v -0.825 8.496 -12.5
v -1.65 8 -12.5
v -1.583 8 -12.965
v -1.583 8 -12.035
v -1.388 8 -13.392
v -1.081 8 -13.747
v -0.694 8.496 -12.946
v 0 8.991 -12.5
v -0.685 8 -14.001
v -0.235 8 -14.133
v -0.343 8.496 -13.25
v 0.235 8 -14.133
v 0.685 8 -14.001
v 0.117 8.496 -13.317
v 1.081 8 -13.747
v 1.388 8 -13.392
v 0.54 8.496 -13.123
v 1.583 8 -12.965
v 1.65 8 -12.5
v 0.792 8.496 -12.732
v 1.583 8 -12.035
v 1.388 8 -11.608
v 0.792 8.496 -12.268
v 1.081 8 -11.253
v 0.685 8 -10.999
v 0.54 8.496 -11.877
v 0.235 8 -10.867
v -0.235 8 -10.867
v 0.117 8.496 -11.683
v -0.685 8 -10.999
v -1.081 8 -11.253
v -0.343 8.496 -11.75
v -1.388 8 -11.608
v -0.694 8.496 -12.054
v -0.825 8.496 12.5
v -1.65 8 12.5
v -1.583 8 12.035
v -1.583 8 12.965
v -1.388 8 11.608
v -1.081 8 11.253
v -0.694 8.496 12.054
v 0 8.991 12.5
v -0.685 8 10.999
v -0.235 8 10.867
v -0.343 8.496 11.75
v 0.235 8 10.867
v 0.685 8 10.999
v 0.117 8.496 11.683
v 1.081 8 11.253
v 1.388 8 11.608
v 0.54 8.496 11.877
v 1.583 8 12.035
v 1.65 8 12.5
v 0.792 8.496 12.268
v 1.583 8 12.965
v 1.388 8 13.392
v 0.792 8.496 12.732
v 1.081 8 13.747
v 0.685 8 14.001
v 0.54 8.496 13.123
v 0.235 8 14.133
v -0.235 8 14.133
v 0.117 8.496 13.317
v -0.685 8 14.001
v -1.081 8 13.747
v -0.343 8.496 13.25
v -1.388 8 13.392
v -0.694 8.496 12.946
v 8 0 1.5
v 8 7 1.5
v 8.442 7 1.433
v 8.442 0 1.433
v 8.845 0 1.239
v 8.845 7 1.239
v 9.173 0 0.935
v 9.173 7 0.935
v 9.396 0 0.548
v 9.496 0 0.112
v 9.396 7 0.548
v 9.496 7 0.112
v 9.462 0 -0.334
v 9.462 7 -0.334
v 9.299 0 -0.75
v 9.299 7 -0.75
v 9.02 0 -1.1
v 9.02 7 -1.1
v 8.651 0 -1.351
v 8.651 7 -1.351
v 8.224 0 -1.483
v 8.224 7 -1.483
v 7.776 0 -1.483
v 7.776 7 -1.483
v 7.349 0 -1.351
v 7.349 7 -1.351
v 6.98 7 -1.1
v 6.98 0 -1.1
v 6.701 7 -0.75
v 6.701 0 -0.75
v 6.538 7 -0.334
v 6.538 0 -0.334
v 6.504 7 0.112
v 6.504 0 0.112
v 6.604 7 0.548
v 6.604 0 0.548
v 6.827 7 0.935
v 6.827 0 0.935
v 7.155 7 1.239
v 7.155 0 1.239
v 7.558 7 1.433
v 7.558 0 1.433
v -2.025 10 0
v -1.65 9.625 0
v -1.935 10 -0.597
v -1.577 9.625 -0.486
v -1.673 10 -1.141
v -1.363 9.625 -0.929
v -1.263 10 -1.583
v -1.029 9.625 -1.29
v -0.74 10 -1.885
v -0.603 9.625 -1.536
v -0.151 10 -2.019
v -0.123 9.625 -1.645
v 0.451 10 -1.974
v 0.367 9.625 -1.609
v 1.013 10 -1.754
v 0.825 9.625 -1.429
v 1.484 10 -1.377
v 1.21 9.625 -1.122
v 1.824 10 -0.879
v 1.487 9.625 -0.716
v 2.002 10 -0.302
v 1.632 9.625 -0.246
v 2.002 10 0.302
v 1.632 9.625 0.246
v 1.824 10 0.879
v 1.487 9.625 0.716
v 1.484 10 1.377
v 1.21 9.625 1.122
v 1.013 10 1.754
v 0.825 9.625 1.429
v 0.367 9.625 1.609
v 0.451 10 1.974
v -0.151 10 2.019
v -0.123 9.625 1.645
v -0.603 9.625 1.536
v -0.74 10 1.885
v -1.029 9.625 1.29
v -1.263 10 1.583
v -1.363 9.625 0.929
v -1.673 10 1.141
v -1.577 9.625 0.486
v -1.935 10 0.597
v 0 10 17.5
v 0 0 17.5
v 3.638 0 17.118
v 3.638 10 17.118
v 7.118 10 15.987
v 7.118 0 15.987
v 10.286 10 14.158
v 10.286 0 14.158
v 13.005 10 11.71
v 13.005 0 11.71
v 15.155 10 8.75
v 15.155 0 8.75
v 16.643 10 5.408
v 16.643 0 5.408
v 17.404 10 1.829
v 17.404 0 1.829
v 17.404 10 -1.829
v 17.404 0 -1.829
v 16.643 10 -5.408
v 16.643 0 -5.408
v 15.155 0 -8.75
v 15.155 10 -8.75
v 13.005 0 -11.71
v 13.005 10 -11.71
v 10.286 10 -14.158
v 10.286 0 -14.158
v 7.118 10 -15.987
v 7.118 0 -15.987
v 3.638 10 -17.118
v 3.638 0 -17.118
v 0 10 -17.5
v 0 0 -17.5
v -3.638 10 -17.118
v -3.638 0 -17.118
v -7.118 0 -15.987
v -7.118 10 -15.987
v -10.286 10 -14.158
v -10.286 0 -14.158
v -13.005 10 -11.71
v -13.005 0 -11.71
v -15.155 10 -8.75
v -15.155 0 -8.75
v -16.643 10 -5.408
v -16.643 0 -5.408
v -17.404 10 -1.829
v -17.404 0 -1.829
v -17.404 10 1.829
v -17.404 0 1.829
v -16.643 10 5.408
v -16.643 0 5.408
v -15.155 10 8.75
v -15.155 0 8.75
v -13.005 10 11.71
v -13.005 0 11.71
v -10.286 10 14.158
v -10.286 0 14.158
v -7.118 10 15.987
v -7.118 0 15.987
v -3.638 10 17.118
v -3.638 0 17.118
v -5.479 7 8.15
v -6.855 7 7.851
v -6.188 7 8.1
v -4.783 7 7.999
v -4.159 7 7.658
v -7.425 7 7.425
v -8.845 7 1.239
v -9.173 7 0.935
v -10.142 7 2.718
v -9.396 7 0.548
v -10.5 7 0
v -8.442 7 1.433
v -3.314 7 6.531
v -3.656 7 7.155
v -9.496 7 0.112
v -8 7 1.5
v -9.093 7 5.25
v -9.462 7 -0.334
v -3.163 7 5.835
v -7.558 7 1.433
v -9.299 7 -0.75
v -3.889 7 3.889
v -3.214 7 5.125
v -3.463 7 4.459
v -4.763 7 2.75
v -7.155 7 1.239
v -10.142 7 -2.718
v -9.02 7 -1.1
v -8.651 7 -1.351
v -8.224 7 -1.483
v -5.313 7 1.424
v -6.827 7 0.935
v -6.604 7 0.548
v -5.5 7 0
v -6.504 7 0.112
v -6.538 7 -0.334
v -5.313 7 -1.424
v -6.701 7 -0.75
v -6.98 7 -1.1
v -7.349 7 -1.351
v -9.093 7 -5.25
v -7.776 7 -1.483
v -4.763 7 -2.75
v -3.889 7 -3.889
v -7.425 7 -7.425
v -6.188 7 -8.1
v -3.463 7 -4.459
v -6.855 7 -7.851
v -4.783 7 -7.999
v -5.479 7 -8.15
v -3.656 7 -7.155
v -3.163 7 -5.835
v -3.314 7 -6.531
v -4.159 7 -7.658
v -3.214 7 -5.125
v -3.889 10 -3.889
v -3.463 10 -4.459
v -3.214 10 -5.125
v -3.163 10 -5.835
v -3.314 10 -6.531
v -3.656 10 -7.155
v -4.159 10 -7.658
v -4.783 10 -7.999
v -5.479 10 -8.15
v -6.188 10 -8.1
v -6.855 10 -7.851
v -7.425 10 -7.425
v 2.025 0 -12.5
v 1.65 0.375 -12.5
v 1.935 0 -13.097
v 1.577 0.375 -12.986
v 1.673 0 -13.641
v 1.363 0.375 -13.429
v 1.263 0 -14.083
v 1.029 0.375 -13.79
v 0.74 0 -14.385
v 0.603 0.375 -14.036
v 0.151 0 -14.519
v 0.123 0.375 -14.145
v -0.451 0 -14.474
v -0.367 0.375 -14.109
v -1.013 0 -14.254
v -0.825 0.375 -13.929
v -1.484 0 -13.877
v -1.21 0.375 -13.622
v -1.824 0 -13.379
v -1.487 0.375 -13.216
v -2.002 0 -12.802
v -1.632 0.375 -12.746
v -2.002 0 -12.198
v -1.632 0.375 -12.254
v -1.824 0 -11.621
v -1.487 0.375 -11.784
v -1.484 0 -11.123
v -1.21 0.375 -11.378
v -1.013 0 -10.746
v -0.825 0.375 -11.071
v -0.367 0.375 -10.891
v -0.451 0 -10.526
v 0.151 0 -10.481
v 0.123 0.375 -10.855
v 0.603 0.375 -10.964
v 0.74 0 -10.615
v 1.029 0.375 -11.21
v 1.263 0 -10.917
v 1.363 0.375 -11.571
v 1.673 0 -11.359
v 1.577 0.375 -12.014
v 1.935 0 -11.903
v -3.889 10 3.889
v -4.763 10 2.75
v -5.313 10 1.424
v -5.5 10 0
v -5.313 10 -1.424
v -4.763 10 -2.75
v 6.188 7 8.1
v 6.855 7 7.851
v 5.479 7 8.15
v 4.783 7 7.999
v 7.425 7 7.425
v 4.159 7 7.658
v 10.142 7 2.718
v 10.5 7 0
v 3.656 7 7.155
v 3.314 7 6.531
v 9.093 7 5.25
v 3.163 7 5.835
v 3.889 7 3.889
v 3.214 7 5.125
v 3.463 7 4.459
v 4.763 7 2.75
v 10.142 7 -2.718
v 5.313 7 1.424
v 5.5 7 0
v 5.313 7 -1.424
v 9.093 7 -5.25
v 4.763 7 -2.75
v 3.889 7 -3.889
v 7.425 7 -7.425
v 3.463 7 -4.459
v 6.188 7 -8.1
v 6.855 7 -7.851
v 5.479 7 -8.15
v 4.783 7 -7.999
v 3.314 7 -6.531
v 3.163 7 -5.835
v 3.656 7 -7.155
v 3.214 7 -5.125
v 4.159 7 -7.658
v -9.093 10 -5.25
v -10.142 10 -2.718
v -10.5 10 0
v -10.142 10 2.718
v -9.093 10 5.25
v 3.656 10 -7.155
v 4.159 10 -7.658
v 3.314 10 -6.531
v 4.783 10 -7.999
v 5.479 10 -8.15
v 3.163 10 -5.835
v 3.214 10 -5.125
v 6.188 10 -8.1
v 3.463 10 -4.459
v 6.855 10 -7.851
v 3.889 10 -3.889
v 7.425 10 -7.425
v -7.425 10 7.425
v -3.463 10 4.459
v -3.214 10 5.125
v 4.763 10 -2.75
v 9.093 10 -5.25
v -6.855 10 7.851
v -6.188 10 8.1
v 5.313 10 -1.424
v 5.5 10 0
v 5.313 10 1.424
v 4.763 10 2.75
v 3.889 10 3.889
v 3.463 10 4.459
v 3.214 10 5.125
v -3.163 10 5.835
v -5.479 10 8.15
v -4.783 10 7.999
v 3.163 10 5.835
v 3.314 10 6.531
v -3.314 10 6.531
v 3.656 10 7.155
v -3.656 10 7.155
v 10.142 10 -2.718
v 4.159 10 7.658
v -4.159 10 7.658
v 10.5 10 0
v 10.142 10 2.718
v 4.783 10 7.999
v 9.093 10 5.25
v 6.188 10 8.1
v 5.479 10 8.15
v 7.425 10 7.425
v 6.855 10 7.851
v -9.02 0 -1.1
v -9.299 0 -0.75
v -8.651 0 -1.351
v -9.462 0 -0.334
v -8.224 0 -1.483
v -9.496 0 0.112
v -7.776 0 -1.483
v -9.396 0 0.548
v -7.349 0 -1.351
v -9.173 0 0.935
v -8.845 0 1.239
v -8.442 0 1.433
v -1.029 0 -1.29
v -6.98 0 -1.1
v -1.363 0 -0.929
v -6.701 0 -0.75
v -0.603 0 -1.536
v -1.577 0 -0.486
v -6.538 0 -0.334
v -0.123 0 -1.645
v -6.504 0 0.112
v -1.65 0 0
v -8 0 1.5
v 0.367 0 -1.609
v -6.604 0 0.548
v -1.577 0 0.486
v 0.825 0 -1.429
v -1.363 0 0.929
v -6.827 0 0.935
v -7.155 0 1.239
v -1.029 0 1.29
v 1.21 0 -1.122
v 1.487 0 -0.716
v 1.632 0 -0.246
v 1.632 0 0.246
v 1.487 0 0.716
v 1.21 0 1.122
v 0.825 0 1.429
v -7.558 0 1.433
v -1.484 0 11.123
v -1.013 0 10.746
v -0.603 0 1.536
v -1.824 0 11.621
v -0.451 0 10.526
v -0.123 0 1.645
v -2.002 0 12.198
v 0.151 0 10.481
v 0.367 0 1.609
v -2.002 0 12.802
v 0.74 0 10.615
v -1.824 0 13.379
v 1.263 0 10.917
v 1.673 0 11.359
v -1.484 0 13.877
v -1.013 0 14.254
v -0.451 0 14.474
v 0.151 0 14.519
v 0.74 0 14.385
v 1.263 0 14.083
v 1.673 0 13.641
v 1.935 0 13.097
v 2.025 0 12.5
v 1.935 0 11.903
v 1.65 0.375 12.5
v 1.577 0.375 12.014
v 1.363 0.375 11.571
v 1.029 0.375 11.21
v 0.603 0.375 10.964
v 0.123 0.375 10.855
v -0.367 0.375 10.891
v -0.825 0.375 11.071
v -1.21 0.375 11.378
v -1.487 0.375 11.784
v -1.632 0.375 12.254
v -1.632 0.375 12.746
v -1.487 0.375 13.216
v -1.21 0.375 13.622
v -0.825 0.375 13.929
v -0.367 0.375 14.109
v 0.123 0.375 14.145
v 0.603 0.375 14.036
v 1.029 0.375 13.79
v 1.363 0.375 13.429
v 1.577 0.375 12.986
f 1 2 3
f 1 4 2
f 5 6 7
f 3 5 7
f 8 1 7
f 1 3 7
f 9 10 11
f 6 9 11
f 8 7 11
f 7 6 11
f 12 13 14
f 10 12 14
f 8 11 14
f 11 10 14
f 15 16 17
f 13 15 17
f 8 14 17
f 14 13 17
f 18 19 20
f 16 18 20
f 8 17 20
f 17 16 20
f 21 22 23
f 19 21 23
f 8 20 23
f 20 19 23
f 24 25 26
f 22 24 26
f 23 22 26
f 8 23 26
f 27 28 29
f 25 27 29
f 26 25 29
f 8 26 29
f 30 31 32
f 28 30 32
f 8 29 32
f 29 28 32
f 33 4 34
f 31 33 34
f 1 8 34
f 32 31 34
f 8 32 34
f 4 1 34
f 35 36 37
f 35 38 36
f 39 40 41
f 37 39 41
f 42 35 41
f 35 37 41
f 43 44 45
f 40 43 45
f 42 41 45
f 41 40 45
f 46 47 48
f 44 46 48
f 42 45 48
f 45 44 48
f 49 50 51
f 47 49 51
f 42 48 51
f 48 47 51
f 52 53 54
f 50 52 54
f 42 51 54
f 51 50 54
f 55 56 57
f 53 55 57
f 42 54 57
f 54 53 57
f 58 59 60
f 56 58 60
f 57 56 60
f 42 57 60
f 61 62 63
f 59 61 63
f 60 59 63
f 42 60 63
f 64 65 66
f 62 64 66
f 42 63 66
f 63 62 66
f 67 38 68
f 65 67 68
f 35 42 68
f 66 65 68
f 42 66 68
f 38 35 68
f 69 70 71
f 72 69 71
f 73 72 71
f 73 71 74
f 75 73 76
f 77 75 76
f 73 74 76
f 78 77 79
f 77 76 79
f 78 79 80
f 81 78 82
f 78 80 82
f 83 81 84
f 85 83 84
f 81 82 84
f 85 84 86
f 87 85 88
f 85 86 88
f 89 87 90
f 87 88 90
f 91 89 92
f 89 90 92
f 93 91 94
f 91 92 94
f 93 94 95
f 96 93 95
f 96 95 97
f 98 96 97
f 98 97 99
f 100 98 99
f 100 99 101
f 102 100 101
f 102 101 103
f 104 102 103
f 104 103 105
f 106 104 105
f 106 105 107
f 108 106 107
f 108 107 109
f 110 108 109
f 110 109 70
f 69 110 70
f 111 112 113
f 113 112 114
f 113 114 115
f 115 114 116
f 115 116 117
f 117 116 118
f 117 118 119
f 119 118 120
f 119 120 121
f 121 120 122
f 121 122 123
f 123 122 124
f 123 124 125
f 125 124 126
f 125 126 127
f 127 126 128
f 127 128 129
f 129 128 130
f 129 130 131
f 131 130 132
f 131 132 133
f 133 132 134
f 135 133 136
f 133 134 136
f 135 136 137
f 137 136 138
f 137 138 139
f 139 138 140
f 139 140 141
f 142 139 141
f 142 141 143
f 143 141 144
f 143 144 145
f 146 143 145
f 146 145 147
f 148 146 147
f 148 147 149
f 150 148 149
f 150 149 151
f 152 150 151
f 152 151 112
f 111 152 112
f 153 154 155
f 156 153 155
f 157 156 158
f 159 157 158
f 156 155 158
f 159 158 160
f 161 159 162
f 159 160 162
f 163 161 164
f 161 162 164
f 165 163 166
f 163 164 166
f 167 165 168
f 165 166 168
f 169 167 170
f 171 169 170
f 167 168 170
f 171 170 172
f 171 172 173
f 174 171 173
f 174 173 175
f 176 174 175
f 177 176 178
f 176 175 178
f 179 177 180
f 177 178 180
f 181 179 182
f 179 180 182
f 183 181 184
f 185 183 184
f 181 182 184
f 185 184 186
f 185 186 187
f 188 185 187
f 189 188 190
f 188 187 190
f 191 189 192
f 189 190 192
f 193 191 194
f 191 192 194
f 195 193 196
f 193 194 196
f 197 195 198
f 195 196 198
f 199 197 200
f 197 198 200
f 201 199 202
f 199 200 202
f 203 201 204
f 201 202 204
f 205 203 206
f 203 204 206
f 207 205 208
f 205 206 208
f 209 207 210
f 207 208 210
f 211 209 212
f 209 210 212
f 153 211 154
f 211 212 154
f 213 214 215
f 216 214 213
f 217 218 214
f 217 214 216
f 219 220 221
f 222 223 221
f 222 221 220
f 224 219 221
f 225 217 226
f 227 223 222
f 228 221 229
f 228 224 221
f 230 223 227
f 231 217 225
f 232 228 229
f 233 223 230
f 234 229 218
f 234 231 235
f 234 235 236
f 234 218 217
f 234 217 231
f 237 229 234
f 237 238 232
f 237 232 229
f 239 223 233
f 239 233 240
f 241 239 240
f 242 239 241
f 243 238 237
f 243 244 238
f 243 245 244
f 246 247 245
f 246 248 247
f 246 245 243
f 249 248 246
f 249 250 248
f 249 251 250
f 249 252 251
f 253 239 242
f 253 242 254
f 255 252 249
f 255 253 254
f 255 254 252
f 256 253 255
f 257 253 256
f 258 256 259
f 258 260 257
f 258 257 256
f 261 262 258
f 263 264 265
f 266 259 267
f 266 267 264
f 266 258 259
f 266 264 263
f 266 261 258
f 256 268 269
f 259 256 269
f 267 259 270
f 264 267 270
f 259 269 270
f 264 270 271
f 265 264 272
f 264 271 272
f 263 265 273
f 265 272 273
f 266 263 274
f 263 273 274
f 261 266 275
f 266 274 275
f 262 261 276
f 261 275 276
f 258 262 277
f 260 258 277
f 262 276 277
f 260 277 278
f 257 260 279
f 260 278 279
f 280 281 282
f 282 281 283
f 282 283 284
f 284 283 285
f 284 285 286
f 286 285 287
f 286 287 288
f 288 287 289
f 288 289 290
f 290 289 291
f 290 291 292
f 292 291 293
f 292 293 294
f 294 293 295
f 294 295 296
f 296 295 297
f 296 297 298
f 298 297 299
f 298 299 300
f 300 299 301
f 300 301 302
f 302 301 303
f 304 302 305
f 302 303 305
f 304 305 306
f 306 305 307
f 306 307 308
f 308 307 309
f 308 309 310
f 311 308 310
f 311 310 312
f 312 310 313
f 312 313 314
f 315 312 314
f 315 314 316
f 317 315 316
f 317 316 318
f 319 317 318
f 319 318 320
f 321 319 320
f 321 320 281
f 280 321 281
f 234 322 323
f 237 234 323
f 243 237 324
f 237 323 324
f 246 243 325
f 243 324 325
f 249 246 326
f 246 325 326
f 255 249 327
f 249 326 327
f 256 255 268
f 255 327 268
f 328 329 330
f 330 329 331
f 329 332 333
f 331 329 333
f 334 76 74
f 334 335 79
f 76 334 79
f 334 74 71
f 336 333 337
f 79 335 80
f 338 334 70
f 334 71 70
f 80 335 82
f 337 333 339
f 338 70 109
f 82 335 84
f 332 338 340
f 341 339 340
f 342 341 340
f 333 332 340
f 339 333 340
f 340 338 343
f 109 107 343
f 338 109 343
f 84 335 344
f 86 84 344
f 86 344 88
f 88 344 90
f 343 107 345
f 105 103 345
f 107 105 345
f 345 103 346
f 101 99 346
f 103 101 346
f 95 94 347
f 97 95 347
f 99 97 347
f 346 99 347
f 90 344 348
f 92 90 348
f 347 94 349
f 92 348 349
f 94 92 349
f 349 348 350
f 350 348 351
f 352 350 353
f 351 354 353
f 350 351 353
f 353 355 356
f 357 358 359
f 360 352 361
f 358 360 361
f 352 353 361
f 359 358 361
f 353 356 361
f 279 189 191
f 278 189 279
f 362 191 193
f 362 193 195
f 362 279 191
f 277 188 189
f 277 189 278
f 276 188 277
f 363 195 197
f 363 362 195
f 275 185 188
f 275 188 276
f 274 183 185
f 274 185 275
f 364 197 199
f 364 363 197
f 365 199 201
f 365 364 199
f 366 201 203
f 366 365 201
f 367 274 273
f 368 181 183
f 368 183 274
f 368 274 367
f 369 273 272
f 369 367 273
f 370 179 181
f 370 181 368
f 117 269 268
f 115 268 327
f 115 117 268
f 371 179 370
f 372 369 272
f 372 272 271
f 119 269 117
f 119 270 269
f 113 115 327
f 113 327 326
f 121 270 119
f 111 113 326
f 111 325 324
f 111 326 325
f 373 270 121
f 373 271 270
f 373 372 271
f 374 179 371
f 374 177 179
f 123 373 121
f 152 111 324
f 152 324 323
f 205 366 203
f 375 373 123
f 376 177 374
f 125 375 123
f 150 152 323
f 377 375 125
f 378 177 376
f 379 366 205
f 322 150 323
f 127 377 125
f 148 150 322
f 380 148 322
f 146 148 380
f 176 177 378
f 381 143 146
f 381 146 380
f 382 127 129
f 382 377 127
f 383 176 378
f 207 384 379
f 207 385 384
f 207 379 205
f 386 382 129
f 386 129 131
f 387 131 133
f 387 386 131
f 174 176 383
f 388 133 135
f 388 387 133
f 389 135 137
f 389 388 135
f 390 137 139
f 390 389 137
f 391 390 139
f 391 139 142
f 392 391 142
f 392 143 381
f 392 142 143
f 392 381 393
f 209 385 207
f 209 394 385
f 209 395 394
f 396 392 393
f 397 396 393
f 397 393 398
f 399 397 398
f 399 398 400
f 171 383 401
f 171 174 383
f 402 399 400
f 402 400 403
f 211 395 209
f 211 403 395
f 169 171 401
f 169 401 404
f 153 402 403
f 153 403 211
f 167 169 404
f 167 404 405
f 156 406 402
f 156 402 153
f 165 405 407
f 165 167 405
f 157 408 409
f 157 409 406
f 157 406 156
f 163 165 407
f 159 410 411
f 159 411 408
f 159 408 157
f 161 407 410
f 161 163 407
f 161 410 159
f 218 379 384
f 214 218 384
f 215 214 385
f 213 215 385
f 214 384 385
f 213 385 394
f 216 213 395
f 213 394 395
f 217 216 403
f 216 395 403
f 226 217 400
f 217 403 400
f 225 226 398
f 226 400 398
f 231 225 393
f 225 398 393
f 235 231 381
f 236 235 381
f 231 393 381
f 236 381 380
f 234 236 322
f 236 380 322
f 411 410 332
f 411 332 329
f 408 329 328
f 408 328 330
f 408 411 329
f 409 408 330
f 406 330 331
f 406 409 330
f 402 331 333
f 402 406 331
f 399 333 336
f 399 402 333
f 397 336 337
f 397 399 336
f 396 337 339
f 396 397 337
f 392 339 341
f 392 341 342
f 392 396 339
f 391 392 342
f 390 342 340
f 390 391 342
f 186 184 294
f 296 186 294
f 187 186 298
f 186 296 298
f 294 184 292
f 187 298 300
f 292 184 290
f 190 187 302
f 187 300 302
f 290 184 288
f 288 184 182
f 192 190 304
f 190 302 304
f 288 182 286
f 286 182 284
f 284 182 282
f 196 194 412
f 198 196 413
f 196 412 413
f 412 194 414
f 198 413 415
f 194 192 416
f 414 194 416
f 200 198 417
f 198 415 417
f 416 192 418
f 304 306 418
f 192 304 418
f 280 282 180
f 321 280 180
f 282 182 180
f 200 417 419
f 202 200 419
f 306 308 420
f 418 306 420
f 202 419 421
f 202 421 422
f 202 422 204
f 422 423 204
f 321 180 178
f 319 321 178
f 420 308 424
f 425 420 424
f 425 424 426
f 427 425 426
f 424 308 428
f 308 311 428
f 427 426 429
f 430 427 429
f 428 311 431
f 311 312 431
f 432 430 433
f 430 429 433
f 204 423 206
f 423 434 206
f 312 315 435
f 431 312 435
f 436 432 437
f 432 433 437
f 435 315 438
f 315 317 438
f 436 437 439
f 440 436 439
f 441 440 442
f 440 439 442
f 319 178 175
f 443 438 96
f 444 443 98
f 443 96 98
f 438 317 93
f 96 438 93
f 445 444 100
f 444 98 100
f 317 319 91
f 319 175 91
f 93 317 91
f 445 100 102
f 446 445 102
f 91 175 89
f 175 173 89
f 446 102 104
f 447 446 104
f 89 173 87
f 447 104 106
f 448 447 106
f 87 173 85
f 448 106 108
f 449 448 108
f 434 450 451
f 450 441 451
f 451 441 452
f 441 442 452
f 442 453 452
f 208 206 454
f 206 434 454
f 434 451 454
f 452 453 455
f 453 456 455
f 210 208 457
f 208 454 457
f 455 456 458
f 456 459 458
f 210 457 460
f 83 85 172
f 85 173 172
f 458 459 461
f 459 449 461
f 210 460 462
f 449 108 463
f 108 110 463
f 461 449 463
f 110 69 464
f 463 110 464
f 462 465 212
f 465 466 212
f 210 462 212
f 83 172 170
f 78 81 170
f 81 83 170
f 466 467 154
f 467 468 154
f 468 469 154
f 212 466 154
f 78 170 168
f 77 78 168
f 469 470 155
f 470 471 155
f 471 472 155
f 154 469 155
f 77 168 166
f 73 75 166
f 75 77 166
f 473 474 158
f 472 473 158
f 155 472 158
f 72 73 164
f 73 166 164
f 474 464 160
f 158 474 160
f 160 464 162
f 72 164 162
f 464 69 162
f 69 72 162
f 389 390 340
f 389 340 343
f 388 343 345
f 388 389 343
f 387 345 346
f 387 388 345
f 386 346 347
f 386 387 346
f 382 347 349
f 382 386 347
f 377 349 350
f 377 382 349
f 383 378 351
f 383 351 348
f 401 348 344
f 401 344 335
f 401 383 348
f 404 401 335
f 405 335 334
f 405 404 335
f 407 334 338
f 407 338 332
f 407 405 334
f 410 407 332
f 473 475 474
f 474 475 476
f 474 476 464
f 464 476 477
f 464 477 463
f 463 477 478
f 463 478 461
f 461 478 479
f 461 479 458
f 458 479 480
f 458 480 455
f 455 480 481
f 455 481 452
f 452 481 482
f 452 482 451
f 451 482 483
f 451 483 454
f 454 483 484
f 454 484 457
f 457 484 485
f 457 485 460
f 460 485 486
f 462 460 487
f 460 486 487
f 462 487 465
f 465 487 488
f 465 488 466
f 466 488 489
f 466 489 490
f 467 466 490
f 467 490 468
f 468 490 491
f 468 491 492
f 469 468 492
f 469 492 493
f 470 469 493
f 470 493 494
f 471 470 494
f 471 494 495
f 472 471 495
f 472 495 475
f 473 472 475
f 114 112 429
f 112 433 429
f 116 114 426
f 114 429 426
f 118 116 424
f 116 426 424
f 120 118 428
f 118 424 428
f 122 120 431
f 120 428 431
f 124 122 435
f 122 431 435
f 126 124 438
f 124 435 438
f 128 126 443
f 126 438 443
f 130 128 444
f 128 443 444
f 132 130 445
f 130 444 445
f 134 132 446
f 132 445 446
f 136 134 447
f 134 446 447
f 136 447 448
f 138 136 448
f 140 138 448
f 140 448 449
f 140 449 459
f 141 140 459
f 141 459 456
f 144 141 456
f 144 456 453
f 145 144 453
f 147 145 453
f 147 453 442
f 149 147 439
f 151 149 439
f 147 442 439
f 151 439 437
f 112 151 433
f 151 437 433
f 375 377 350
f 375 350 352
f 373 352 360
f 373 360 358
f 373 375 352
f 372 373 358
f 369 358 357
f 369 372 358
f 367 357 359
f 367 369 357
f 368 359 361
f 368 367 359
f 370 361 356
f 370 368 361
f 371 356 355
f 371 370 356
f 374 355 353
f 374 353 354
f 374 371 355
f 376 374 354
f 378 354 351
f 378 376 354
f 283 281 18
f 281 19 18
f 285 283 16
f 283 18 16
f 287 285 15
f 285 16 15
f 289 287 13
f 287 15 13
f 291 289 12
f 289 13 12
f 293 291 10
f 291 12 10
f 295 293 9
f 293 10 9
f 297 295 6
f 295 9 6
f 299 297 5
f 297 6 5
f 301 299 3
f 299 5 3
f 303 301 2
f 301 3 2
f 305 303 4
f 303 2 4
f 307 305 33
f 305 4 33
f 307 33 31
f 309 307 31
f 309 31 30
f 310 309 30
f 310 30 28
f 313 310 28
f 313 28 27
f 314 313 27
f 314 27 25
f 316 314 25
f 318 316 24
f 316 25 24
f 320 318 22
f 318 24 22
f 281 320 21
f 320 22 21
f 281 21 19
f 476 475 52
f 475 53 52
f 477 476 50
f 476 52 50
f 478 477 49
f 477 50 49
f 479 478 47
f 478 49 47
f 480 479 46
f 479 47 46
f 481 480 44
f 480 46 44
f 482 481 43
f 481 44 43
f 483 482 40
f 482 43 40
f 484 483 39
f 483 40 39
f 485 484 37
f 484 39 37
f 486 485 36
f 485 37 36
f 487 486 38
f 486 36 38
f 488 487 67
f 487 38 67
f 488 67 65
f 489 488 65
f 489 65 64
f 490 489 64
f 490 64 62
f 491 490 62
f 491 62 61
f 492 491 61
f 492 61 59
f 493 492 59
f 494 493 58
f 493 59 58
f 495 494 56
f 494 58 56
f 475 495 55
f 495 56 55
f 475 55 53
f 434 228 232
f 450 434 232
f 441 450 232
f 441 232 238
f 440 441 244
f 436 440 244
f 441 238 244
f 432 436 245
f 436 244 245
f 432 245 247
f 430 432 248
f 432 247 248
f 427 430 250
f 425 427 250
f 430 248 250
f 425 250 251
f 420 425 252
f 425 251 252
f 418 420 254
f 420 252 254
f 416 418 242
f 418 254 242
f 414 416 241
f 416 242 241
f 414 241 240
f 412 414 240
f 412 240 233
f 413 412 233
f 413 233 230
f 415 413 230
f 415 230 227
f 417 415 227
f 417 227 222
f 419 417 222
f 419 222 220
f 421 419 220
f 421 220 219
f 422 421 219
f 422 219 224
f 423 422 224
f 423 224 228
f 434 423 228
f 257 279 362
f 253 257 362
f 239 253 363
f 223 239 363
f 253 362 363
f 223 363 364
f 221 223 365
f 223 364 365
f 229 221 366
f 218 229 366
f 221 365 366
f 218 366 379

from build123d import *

# Parameters (mm, degrees)
IZIM1_R                     = 17.5
Y_KSEKLIK_EKSTR_ZYON1_DEPTH = 10
KES_EKSTR_ZYON1_DEPTH       = 3
M4_DI_LI_DELIK1_D           = 3.3
M4_DI_LI_DELIK1_DEPTH       = 8
M4_DI_LI_DELIK1_CSINK_D     = 4.05
M4_DI_LI_DELIK1_CSINK_ANGLE = 90
M4_DI_LI_DELIK1_TIP         = 0.991420021
M4_DI_LI_DELIK2_D           = 3.3
M4_DI_LI_DELIK2_CSINK_D     = 4.05
M4_DI_LI_DELIK2_CSINK_ANGLE = 90
IZIM10_R                    = 1.5
KES_EKSTR_ZYON3_DEPTH       = 26.719642299


with BuildPart() as part:
    # Çizim1 → Yükseklik-Ekstrüzyon1 (new body)
    with BuildSketch(Plane(origin=(0, 0, 0), x_dir=(1, 0, 0), z_dir=(0, 1, 0))):
        with Locations(Location((0, 0, 0), (0, 0, 270))):
            Circle(IZIM1_R)
    extrude(amount=Y_KSEKLIK_EKSTR_ZYON1_DEPTH)

    # Çizim2 → Kes-Ekstrüzyon1 (cut)
    with BuildSketch(Plane(origin=(0, 10, 0), x_dir=(1, 0, 0), z_dir=(0, 1, 0))):
        with BuildLine():
            ThreePointArc((-7.424621202, 7.424621202), (-10.5, 0), (-7.424621202, -7.424621202))
            ThreePointArc((-7.424621202, -7.424621202), (-3.889087297, -7.424621202), (-3.889087297, -3.889087297))
            ThreePointArc((-3.889087297, -3.889087297), (-5.5, 0), (-3.889087297, 3.889087297))
            ThreePointArc((-3.889087297, 3.889087297), (-3.889087297, 7.424621202), (-7.424621202, 7.424621202))
        make_face()
        with BuildLine():
            ThreePointArc((7.424621202, 7.424621202), (10.5, 0), (7.424621202, -7.424621202))
            ThreePointArc((7.424621202, -7.424621202), (3.889087297, -7.424621202), (3.889087297, -3.889087297))
            ThreePointArc((3.889087297, -3.889087297), (5.5, 0), (3.889087297, 3.889087297))
            ThreePointArc((3.889087297, 3.889087297), (3.889087297, 7.424621202), (7.424621202, 7.424621202))
        make_face()
    extrude(amount=-KES_EKSTR_ZYON1_DEPTH, mode=Mode.SUBTRACT)

    # M4 Dişli Delik1
    with Locations(Plane(origin=(0, 0, 0), x_dir=(-1, 0, 0), z_dir=(0, -1, 0))):
        with Locations((0, -12.5), (0, 12.5)):
            CounterSinkHole(M4_DI_LI_DELIK1_D / 2, M4_DI_LI_DELIK1_CSINK_D / 2, depth=M4_DI_LI_DELIK1_DEPTH, counter_sink_angle=M4_DI_LI_DELIK1_CSINK_ANGLE)
            with Locations((0, 0, -(M4_DI_LI_DELIK1_DEPTH + M4_DI_LI_DELIK1_TIP / 2))):  # 118° drill point
                Cone(0, M4_DI_LI_DELIK1_D / 2, M4_DI_LI_DELIK1_TIP, mode=Mode.SUBTRACT)

    # M4 Dişli Delik2 (through all)
    with Locations(Plane(origin=(0, 10, 0), x_dir=(1, 0, 0), z_dir=(0, 1, 0))):
        with Locations((0, 0)):
            CounterSinkHole(M4_DI_LI_DELIK2_D / 2, M4_DI_LI_DELIK2_CSINK_D / 2, counter_sink_angle=M4_DI_LI_DELIK2_CSINK_ANGLE)

    # Çizim10 → Kes-Ekstrüzyon3 (cut, through all)
    with BuildSketch(Plane(origin=(0, 7, 0), x_dir=(1, 0, 0), z_dir=(0, 1, 0))):
        with Locations(Location((-8, 0, 0), (0, 0, 270))):
            Circle(IZIM10_R)
        with Locations(Location((8, 0, 0), (0, 0, 270))):
            Circle(IZIM10_R)
    extrude(amount=-KES_EKSTR_ZYON3_DEPTH, mode=Mode.SUBTRACT)


solid = part.part
